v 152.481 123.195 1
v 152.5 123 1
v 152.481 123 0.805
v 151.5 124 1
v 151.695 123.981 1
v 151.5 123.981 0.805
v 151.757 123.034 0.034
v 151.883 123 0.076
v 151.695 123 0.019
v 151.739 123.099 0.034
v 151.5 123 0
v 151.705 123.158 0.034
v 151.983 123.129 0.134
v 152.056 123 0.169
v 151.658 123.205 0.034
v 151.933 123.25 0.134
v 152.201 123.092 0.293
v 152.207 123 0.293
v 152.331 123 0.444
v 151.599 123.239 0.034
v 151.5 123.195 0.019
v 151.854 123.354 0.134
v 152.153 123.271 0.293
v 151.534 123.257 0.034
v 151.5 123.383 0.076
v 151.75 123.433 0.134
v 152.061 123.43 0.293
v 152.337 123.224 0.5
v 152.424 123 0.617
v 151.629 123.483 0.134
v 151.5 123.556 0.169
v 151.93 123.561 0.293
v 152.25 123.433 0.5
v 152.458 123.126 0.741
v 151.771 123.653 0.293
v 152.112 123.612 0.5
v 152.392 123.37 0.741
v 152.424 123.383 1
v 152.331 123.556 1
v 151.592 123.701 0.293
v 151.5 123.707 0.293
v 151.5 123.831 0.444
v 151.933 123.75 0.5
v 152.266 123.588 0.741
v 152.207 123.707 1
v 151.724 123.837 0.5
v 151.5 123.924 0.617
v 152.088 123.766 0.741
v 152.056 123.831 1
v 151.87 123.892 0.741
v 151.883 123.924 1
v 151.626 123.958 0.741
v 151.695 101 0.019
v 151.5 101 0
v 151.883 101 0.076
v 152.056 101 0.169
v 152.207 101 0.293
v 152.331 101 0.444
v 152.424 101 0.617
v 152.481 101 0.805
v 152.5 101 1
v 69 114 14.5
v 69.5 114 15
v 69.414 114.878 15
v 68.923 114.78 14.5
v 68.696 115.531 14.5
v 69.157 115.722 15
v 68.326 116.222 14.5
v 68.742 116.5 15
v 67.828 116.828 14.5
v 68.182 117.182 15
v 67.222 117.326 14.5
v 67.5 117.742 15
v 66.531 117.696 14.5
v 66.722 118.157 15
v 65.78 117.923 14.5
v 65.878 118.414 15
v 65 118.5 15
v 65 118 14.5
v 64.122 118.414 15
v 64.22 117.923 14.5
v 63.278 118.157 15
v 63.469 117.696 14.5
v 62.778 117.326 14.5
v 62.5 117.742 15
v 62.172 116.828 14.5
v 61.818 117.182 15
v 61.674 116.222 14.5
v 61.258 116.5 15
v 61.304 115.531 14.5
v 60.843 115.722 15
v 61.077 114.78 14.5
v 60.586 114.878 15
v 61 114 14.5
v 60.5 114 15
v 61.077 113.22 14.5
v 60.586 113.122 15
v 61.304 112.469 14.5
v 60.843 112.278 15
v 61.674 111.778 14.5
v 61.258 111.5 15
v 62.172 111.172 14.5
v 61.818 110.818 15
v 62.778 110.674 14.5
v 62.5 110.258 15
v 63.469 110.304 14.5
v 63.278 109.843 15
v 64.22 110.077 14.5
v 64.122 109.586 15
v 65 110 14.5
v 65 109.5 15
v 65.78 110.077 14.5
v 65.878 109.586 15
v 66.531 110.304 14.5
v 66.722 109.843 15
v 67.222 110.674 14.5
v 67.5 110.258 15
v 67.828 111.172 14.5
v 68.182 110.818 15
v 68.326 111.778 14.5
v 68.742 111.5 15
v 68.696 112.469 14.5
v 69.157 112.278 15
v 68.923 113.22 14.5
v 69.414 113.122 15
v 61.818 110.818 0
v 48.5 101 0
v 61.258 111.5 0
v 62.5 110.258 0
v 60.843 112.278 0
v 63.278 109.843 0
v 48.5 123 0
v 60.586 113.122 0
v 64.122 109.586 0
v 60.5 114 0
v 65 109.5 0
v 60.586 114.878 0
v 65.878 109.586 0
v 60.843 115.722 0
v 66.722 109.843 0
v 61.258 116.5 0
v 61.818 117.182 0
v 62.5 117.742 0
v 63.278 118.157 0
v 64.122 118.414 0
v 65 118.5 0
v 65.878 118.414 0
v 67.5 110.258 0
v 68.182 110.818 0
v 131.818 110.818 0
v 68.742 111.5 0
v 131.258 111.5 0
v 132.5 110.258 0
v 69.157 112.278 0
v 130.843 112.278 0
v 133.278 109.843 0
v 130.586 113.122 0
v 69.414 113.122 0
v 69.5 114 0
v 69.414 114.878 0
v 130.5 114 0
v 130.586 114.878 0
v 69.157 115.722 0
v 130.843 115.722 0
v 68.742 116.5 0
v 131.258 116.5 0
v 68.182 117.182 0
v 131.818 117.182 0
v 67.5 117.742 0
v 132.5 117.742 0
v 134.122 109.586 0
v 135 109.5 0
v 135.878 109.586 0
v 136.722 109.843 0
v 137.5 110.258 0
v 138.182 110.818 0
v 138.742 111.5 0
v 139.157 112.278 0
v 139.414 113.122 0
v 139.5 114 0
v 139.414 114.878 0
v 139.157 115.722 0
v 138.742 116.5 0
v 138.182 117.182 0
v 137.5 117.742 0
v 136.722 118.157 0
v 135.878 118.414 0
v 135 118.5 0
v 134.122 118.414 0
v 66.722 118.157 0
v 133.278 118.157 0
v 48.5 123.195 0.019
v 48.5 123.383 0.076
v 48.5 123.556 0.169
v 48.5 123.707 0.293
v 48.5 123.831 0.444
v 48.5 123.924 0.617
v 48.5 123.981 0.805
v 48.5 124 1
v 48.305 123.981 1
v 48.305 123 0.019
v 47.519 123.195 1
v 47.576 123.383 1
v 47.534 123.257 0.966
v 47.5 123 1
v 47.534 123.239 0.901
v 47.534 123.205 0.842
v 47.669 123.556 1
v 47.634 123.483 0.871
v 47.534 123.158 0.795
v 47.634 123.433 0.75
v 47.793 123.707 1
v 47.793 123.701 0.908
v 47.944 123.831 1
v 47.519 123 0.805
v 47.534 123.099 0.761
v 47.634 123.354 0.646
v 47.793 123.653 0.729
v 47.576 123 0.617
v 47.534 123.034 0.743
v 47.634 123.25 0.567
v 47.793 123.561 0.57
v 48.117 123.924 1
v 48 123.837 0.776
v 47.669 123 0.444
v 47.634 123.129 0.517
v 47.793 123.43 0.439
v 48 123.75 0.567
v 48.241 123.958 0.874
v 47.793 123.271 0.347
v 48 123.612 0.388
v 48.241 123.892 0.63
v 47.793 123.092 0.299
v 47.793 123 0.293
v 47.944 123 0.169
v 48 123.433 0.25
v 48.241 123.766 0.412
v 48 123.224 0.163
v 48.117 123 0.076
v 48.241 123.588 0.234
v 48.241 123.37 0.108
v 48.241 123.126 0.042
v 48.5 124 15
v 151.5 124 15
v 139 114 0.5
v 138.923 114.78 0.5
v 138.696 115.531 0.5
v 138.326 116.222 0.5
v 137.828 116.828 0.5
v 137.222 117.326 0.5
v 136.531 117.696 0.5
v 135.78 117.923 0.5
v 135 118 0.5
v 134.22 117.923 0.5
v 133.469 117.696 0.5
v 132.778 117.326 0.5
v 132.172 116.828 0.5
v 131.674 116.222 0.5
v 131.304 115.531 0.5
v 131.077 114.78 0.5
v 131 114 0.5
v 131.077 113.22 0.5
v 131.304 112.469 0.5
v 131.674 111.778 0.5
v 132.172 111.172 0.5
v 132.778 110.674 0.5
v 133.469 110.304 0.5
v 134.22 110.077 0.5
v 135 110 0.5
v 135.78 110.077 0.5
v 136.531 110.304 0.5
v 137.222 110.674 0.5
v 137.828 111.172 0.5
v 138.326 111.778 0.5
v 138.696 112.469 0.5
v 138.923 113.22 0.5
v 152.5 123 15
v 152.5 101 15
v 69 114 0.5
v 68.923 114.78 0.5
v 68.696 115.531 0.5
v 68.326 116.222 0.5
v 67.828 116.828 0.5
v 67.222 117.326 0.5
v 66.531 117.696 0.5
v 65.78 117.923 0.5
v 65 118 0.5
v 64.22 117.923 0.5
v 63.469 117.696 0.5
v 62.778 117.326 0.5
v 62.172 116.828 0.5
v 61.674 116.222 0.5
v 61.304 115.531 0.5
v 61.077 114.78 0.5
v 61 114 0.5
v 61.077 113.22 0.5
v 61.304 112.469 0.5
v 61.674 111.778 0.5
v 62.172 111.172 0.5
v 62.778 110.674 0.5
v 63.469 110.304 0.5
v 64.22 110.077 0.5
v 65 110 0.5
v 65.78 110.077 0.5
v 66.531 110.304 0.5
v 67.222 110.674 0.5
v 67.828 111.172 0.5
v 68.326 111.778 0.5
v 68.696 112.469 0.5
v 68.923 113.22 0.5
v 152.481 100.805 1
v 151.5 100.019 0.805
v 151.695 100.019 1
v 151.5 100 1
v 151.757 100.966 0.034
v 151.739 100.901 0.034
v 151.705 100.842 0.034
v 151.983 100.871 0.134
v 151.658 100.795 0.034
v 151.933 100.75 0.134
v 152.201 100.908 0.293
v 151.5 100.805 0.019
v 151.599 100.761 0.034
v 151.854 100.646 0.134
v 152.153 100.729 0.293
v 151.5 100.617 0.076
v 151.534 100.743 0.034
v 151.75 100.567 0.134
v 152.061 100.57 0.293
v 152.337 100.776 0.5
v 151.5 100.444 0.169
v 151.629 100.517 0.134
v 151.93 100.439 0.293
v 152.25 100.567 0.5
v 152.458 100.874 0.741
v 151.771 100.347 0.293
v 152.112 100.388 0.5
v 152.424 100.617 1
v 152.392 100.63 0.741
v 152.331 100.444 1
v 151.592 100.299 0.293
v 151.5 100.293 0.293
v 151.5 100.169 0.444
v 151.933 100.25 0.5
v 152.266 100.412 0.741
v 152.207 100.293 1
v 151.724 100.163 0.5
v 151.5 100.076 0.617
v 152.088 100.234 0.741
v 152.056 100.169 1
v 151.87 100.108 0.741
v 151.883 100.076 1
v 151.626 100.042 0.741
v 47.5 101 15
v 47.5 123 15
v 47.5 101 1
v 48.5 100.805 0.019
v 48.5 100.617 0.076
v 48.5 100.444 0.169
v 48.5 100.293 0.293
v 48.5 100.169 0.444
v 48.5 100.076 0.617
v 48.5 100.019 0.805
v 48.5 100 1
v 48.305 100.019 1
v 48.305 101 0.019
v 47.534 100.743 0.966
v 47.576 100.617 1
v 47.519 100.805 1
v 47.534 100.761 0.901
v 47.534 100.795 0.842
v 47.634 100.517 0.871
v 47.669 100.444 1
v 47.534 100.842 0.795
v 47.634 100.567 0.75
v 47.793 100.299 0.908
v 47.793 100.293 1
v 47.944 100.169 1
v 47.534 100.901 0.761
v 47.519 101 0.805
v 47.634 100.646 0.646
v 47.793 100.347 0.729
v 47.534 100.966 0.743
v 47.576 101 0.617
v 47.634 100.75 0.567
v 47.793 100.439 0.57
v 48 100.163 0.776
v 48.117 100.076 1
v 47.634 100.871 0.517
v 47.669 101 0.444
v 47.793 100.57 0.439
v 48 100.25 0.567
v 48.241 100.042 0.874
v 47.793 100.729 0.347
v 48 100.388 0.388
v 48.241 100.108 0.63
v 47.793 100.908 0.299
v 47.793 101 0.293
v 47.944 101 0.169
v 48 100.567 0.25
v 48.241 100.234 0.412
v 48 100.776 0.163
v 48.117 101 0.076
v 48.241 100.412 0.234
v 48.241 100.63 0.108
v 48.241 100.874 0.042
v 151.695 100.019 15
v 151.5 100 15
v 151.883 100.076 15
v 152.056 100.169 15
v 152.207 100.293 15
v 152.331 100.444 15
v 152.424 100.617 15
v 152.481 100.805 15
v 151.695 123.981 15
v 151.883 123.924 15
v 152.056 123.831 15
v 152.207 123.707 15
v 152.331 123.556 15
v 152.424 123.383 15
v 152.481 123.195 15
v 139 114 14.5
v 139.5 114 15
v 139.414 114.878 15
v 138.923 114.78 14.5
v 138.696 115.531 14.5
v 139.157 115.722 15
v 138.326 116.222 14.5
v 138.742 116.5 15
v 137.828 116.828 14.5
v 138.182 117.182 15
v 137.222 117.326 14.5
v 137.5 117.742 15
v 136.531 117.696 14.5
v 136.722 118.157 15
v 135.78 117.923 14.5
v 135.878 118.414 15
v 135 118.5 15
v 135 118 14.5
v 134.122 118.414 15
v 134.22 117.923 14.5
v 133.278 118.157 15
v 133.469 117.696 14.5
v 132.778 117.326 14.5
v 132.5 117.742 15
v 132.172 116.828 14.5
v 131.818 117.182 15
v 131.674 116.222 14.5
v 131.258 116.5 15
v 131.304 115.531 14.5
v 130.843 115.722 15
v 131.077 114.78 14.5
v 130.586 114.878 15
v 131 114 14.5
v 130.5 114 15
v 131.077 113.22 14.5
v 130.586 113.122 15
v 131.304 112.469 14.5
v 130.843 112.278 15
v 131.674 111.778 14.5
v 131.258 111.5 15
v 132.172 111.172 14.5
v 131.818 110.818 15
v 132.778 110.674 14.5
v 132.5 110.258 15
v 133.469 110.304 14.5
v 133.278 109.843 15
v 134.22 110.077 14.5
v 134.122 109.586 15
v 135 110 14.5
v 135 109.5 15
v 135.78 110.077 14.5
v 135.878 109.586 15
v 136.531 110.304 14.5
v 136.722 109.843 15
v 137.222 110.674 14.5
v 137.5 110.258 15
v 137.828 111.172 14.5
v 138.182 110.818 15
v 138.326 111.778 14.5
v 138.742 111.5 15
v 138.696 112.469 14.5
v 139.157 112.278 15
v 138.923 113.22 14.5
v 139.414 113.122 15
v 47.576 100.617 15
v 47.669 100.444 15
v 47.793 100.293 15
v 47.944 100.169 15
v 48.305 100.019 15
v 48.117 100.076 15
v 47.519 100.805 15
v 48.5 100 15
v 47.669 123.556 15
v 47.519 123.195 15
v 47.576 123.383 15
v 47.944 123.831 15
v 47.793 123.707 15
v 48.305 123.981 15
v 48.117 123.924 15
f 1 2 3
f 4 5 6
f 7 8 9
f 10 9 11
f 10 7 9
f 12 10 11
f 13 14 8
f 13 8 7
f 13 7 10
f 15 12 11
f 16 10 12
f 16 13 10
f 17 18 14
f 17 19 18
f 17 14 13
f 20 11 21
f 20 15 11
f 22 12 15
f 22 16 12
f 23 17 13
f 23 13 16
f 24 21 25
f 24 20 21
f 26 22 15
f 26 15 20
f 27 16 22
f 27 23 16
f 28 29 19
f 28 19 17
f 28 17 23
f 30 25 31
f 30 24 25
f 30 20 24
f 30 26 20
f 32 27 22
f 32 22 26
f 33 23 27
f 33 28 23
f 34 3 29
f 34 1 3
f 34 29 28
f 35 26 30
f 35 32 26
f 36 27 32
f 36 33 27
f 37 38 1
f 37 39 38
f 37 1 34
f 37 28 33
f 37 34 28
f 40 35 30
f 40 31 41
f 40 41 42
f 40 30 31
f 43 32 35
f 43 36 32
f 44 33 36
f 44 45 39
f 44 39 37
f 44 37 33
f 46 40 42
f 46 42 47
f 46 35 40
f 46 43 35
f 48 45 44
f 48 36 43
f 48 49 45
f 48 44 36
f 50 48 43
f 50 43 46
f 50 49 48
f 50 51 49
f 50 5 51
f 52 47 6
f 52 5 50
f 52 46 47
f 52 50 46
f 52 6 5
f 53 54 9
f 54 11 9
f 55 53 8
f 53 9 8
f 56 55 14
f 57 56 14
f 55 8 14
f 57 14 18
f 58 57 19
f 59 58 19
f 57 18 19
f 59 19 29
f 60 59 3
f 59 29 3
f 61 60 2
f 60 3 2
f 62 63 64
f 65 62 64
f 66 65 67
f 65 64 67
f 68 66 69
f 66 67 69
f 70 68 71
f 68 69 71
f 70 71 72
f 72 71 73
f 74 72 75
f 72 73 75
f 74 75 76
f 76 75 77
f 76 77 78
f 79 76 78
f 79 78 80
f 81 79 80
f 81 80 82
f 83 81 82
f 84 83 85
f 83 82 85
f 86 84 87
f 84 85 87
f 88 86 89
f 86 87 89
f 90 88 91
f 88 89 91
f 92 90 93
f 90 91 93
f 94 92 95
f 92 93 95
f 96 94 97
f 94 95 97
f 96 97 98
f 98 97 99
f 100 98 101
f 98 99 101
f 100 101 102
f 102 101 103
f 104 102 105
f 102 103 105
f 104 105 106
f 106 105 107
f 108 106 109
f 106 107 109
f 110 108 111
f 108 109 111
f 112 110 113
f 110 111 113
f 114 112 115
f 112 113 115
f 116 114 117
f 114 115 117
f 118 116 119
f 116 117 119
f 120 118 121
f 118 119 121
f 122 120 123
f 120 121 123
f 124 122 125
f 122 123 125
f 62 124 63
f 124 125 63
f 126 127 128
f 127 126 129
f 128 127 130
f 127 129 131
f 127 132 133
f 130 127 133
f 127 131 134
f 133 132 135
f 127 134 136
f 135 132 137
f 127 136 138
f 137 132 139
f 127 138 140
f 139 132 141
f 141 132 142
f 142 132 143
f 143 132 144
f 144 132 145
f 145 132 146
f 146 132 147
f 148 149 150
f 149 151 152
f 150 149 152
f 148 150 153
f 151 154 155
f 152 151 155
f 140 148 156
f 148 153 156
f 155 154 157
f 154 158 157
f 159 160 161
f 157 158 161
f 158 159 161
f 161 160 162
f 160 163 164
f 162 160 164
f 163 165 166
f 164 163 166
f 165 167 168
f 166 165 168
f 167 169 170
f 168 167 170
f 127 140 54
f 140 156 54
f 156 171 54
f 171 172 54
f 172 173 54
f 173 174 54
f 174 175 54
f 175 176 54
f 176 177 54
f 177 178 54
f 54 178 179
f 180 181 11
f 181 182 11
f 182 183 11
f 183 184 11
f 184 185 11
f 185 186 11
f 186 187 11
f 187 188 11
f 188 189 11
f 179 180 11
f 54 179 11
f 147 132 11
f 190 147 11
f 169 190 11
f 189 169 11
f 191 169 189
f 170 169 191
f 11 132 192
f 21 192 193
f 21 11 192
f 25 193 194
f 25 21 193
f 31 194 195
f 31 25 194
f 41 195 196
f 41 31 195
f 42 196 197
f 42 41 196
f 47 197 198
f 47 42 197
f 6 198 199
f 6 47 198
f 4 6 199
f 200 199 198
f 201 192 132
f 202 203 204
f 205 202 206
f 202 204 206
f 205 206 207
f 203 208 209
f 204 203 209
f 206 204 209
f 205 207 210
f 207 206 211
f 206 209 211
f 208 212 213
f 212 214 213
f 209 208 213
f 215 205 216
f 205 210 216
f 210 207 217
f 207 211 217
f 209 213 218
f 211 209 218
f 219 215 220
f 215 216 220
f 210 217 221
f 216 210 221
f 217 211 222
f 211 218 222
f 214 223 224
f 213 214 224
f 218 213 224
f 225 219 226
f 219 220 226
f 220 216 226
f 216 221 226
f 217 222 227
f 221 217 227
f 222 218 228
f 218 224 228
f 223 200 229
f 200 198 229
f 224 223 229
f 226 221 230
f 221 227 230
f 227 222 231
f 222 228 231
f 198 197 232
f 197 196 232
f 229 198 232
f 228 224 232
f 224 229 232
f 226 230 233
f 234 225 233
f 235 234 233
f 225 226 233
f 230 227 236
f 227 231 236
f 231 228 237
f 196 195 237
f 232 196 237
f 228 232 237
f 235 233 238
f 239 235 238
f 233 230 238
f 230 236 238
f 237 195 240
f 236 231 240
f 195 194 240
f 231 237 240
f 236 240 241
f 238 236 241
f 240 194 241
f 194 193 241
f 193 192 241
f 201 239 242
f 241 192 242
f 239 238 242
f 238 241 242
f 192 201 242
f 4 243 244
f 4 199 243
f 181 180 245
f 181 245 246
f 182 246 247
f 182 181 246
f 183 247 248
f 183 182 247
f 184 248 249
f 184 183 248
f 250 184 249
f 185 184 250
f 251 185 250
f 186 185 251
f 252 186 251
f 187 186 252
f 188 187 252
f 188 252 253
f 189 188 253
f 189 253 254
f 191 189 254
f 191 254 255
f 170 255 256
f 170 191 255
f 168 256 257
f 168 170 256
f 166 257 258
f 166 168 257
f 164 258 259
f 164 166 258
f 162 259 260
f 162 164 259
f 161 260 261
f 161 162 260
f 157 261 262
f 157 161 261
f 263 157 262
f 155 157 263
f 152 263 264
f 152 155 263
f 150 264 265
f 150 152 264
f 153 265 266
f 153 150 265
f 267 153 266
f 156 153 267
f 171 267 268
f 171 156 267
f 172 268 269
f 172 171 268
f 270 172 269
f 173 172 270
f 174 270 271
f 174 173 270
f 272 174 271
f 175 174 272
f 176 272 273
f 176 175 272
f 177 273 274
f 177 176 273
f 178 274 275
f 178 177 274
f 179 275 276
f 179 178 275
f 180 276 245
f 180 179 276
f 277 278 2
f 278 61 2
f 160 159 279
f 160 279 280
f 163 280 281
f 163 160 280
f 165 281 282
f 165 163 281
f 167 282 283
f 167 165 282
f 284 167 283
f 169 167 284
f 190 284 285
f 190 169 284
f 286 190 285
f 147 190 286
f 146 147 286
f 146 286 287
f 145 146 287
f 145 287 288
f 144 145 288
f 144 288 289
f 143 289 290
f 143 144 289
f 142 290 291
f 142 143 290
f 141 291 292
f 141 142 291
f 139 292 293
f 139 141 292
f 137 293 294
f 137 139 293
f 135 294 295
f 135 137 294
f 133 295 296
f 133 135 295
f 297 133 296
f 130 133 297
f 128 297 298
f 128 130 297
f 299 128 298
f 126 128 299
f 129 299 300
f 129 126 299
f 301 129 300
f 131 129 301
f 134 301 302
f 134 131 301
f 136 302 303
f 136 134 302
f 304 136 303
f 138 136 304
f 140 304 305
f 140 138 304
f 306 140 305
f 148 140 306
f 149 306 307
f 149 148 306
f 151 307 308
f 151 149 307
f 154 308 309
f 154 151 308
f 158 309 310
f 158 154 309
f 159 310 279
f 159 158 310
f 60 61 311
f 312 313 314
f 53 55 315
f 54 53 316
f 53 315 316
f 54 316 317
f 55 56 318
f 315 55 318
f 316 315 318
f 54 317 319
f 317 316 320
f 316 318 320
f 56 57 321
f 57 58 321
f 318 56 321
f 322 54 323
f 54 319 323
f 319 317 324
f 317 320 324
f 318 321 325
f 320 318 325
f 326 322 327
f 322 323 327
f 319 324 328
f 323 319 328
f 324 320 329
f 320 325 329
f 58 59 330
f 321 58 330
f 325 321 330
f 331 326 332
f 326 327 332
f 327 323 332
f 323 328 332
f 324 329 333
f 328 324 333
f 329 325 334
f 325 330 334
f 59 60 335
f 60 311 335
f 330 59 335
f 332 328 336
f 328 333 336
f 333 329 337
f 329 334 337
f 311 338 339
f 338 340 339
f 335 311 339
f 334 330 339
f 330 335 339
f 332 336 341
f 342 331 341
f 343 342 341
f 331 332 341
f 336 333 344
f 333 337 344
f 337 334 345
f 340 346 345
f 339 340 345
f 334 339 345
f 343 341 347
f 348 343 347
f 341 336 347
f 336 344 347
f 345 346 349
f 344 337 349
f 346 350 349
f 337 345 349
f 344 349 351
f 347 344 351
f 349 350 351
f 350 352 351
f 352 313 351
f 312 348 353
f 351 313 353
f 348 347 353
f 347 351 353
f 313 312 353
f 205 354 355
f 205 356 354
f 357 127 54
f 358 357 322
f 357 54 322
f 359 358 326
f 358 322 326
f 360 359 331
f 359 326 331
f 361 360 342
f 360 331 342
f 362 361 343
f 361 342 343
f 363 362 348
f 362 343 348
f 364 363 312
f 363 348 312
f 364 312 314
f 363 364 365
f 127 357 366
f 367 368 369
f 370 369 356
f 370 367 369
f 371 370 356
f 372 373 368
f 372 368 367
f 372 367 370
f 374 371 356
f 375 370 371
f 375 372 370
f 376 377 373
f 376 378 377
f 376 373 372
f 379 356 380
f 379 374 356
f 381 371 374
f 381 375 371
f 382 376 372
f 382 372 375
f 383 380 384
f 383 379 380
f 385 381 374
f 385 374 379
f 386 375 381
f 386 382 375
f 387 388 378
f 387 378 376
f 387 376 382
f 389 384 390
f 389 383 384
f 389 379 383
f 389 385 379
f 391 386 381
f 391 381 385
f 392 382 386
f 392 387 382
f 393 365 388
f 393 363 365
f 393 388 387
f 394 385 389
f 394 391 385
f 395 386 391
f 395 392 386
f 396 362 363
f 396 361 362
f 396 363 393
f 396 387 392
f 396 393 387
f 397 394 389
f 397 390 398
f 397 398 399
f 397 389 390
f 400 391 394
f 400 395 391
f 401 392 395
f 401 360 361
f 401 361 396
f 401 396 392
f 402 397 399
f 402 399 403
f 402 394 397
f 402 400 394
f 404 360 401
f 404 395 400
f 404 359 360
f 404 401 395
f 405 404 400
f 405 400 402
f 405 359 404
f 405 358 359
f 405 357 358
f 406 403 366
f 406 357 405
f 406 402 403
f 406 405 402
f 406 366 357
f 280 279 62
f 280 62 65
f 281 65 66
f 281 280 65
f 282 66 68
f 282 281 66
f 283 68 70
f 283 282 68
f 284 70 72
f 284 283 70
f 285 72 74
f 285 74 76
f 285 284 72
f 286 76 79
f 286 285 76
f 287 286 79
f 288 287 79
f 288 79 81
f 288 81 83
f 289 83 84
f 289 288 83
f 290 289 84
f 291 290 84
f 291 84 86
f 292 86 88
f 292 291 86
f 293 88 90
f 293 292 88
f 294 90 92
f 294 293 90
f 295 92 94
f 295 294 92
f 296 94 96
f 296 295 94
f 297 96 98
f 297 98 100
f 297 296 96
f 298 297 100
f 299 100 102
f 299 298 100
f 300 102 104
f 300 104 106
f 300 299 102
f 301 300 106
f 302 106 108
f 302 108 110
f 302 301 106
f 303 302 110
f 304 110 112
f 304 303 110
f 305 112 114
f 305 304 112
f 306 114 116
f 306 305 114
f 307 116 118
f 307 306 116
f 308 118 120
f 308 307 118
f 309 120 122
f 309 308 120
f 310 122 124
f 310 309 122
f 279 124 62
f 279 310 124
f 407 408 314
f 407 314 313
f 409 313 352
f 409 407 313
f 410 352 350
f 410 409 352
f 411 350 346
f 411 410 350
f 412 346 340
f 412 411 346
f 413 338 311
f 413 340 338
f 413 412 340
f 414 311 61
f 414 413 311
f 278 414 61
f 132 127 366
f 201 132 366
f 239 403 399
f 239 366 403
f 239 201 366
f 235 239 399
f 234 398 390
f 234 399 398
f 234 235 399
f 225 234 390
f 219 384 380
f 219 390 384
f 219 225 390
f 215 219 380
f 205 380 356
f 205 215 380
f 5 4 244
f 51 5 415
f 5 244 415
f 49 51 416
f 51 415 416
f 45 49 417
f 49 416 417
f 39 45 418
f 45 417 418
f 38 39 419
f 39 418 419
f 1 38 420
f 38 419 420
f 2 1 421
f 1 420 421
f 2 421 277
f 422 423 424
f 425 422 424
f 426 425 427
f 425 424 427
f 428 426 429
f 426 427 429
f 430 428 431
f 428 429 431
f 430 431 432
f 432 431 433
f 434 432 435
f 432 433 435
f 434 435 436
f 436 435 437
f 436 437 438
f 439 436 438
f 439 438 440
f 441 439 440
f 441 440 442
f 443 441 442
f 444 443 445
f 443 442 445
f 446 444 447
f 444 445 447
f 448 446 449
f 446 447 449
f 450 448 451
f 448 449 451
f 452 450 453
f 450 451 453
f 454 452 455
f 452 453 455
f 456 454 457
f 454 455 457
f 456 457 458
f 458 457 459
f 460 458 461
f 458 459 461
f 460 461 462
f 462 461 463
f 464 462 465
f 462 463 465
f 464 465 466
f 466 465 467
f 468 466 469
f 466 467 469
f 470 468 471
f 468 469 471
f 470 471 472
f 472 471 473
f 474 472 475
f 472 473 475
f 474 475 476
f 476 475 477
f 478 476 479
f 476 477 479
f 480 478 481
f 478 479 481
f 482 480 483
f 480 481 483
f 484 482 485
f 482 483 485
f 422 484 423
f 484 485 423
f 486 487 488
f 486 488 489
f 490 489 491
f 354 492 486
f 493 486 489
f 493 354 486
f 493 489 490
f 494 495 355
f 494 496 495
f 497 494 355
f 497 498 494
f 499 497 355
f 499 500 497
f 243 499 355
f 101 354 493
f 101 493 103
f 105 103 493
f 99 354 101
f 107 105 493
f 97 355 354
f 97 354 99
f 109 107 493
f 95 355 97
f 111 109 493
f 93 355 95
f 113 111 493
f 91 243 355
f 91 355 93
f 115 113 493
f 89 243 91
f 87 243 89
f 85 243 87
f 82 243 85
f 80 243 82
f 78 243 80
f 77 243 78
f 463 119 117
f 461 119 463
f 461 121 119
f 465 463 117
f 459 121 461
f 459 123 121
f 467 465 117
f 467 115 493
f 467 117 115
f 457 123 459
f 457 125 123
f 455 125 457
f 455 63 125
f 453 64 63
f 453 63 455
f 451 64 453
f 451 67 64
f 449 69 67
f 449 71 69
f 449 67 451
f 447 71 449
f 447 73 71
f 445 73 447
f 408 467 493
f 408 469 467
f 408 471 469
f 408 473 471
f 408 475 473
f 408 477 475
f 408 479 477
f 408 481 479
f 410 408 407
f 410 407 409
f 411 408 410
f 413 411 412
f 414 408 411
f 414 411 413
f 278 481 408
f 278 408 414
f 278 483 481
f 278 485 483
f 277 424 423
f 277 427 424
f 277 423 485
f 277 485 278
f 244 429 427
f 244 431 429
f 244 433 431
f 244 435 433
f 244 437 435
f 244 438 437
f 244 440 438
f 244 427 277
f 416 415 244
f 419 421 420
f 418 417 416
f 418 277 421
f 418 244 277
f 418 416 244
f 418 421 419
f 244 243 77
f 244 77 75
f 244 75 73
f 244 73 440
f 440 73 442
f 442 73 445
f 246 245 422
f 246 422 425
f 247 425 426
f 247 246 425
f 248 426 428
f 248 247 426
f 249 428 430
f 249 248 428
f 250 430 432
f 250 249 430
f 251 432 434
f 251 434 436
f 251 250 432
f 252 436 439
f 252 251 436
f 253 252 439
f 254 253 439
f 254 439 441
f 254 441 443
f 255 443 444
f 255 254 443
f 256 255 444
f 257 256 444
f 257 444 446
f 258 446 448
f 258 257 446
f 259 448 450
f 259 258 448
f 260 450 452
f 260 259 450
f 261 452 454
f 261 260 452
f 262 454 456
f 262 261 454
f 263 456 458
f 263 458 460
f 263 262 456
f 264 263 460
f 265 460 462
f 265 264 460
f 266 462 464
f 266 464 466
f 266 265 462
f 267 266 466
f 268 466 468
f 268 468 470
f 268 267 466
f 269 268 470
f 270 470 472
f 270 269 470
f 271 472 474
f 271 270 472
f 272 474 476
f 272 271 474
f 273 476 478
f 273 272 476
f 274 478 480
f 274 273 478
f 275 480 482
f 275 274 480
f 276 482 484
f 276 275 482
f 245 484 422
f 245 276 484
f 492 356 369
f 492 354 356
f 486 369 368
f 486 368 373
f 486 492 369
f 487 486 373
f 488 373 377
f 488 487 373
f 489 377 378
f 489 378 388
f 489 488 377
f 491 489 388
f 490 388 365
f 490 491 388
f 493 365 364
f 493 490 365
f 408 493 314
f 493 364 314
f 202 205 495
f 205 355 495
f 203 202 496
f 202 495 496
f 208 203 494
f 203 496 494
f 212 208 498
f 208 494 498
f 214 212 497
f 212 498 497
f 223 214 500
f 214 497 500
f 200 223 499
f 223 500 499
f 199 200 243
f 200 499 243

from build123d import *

# Parameters (mm, degrees)
SKETCH006_W     = 105
SKETCH006_H     = 24
SKETCH006_R     = 4
PAD005_DEPTH    = 15
CHAMFER002_SIZE = 0.5
FILLET003_R     = 1


with BuildPart() as part:
    # Sketch006 → Pad005 (new body)
    with BuildSketch(Plane(origin=(100, 100, 0), x_dir=(1, 0, 0), z_dir=(0, 0, 1))):
        with Locations((0, 12)):
            Rectangle(SKETCH006_W, SKETCH006_H)
        with Locations((-35, 14)):
            Circle(SKETCH006_R, mode=Mode.SUBTRACT)
        with Locations((35, 14)):
            Circle(SKETCH006_R, mode=Mode.SUBTRACT)
    extrude(amount=PAD005_DEPTH)

    # Chamfer002
    chamfer002_edges = [part.edges().sort_by_distance(p)[0] for p in [
        (61, 114, 0),
        (131, 114, 0),
        (131, 114, 15),
        (61, 114, 15),
    ]]
    chamfer(chamfer002_edges, length=CHAMFER002_SIZE)

    # Fillet003
    fillet003_edges = [part.edges().sort_by_distance(p)[0] for p in [
        (152.5, 100, 7.5),
        (152.5, 124, 7.5),
        (152.5, 112, 0),
        (100, 100, 0),
        (100, 124, 0),
        (47.5, 100, 7.5),
        (47.5, 124, 7.5),
        (47.5, 112, 0),
    ]]
    fillet(fillet003_edges, radius=FILLET003_R)


solid = part.part
